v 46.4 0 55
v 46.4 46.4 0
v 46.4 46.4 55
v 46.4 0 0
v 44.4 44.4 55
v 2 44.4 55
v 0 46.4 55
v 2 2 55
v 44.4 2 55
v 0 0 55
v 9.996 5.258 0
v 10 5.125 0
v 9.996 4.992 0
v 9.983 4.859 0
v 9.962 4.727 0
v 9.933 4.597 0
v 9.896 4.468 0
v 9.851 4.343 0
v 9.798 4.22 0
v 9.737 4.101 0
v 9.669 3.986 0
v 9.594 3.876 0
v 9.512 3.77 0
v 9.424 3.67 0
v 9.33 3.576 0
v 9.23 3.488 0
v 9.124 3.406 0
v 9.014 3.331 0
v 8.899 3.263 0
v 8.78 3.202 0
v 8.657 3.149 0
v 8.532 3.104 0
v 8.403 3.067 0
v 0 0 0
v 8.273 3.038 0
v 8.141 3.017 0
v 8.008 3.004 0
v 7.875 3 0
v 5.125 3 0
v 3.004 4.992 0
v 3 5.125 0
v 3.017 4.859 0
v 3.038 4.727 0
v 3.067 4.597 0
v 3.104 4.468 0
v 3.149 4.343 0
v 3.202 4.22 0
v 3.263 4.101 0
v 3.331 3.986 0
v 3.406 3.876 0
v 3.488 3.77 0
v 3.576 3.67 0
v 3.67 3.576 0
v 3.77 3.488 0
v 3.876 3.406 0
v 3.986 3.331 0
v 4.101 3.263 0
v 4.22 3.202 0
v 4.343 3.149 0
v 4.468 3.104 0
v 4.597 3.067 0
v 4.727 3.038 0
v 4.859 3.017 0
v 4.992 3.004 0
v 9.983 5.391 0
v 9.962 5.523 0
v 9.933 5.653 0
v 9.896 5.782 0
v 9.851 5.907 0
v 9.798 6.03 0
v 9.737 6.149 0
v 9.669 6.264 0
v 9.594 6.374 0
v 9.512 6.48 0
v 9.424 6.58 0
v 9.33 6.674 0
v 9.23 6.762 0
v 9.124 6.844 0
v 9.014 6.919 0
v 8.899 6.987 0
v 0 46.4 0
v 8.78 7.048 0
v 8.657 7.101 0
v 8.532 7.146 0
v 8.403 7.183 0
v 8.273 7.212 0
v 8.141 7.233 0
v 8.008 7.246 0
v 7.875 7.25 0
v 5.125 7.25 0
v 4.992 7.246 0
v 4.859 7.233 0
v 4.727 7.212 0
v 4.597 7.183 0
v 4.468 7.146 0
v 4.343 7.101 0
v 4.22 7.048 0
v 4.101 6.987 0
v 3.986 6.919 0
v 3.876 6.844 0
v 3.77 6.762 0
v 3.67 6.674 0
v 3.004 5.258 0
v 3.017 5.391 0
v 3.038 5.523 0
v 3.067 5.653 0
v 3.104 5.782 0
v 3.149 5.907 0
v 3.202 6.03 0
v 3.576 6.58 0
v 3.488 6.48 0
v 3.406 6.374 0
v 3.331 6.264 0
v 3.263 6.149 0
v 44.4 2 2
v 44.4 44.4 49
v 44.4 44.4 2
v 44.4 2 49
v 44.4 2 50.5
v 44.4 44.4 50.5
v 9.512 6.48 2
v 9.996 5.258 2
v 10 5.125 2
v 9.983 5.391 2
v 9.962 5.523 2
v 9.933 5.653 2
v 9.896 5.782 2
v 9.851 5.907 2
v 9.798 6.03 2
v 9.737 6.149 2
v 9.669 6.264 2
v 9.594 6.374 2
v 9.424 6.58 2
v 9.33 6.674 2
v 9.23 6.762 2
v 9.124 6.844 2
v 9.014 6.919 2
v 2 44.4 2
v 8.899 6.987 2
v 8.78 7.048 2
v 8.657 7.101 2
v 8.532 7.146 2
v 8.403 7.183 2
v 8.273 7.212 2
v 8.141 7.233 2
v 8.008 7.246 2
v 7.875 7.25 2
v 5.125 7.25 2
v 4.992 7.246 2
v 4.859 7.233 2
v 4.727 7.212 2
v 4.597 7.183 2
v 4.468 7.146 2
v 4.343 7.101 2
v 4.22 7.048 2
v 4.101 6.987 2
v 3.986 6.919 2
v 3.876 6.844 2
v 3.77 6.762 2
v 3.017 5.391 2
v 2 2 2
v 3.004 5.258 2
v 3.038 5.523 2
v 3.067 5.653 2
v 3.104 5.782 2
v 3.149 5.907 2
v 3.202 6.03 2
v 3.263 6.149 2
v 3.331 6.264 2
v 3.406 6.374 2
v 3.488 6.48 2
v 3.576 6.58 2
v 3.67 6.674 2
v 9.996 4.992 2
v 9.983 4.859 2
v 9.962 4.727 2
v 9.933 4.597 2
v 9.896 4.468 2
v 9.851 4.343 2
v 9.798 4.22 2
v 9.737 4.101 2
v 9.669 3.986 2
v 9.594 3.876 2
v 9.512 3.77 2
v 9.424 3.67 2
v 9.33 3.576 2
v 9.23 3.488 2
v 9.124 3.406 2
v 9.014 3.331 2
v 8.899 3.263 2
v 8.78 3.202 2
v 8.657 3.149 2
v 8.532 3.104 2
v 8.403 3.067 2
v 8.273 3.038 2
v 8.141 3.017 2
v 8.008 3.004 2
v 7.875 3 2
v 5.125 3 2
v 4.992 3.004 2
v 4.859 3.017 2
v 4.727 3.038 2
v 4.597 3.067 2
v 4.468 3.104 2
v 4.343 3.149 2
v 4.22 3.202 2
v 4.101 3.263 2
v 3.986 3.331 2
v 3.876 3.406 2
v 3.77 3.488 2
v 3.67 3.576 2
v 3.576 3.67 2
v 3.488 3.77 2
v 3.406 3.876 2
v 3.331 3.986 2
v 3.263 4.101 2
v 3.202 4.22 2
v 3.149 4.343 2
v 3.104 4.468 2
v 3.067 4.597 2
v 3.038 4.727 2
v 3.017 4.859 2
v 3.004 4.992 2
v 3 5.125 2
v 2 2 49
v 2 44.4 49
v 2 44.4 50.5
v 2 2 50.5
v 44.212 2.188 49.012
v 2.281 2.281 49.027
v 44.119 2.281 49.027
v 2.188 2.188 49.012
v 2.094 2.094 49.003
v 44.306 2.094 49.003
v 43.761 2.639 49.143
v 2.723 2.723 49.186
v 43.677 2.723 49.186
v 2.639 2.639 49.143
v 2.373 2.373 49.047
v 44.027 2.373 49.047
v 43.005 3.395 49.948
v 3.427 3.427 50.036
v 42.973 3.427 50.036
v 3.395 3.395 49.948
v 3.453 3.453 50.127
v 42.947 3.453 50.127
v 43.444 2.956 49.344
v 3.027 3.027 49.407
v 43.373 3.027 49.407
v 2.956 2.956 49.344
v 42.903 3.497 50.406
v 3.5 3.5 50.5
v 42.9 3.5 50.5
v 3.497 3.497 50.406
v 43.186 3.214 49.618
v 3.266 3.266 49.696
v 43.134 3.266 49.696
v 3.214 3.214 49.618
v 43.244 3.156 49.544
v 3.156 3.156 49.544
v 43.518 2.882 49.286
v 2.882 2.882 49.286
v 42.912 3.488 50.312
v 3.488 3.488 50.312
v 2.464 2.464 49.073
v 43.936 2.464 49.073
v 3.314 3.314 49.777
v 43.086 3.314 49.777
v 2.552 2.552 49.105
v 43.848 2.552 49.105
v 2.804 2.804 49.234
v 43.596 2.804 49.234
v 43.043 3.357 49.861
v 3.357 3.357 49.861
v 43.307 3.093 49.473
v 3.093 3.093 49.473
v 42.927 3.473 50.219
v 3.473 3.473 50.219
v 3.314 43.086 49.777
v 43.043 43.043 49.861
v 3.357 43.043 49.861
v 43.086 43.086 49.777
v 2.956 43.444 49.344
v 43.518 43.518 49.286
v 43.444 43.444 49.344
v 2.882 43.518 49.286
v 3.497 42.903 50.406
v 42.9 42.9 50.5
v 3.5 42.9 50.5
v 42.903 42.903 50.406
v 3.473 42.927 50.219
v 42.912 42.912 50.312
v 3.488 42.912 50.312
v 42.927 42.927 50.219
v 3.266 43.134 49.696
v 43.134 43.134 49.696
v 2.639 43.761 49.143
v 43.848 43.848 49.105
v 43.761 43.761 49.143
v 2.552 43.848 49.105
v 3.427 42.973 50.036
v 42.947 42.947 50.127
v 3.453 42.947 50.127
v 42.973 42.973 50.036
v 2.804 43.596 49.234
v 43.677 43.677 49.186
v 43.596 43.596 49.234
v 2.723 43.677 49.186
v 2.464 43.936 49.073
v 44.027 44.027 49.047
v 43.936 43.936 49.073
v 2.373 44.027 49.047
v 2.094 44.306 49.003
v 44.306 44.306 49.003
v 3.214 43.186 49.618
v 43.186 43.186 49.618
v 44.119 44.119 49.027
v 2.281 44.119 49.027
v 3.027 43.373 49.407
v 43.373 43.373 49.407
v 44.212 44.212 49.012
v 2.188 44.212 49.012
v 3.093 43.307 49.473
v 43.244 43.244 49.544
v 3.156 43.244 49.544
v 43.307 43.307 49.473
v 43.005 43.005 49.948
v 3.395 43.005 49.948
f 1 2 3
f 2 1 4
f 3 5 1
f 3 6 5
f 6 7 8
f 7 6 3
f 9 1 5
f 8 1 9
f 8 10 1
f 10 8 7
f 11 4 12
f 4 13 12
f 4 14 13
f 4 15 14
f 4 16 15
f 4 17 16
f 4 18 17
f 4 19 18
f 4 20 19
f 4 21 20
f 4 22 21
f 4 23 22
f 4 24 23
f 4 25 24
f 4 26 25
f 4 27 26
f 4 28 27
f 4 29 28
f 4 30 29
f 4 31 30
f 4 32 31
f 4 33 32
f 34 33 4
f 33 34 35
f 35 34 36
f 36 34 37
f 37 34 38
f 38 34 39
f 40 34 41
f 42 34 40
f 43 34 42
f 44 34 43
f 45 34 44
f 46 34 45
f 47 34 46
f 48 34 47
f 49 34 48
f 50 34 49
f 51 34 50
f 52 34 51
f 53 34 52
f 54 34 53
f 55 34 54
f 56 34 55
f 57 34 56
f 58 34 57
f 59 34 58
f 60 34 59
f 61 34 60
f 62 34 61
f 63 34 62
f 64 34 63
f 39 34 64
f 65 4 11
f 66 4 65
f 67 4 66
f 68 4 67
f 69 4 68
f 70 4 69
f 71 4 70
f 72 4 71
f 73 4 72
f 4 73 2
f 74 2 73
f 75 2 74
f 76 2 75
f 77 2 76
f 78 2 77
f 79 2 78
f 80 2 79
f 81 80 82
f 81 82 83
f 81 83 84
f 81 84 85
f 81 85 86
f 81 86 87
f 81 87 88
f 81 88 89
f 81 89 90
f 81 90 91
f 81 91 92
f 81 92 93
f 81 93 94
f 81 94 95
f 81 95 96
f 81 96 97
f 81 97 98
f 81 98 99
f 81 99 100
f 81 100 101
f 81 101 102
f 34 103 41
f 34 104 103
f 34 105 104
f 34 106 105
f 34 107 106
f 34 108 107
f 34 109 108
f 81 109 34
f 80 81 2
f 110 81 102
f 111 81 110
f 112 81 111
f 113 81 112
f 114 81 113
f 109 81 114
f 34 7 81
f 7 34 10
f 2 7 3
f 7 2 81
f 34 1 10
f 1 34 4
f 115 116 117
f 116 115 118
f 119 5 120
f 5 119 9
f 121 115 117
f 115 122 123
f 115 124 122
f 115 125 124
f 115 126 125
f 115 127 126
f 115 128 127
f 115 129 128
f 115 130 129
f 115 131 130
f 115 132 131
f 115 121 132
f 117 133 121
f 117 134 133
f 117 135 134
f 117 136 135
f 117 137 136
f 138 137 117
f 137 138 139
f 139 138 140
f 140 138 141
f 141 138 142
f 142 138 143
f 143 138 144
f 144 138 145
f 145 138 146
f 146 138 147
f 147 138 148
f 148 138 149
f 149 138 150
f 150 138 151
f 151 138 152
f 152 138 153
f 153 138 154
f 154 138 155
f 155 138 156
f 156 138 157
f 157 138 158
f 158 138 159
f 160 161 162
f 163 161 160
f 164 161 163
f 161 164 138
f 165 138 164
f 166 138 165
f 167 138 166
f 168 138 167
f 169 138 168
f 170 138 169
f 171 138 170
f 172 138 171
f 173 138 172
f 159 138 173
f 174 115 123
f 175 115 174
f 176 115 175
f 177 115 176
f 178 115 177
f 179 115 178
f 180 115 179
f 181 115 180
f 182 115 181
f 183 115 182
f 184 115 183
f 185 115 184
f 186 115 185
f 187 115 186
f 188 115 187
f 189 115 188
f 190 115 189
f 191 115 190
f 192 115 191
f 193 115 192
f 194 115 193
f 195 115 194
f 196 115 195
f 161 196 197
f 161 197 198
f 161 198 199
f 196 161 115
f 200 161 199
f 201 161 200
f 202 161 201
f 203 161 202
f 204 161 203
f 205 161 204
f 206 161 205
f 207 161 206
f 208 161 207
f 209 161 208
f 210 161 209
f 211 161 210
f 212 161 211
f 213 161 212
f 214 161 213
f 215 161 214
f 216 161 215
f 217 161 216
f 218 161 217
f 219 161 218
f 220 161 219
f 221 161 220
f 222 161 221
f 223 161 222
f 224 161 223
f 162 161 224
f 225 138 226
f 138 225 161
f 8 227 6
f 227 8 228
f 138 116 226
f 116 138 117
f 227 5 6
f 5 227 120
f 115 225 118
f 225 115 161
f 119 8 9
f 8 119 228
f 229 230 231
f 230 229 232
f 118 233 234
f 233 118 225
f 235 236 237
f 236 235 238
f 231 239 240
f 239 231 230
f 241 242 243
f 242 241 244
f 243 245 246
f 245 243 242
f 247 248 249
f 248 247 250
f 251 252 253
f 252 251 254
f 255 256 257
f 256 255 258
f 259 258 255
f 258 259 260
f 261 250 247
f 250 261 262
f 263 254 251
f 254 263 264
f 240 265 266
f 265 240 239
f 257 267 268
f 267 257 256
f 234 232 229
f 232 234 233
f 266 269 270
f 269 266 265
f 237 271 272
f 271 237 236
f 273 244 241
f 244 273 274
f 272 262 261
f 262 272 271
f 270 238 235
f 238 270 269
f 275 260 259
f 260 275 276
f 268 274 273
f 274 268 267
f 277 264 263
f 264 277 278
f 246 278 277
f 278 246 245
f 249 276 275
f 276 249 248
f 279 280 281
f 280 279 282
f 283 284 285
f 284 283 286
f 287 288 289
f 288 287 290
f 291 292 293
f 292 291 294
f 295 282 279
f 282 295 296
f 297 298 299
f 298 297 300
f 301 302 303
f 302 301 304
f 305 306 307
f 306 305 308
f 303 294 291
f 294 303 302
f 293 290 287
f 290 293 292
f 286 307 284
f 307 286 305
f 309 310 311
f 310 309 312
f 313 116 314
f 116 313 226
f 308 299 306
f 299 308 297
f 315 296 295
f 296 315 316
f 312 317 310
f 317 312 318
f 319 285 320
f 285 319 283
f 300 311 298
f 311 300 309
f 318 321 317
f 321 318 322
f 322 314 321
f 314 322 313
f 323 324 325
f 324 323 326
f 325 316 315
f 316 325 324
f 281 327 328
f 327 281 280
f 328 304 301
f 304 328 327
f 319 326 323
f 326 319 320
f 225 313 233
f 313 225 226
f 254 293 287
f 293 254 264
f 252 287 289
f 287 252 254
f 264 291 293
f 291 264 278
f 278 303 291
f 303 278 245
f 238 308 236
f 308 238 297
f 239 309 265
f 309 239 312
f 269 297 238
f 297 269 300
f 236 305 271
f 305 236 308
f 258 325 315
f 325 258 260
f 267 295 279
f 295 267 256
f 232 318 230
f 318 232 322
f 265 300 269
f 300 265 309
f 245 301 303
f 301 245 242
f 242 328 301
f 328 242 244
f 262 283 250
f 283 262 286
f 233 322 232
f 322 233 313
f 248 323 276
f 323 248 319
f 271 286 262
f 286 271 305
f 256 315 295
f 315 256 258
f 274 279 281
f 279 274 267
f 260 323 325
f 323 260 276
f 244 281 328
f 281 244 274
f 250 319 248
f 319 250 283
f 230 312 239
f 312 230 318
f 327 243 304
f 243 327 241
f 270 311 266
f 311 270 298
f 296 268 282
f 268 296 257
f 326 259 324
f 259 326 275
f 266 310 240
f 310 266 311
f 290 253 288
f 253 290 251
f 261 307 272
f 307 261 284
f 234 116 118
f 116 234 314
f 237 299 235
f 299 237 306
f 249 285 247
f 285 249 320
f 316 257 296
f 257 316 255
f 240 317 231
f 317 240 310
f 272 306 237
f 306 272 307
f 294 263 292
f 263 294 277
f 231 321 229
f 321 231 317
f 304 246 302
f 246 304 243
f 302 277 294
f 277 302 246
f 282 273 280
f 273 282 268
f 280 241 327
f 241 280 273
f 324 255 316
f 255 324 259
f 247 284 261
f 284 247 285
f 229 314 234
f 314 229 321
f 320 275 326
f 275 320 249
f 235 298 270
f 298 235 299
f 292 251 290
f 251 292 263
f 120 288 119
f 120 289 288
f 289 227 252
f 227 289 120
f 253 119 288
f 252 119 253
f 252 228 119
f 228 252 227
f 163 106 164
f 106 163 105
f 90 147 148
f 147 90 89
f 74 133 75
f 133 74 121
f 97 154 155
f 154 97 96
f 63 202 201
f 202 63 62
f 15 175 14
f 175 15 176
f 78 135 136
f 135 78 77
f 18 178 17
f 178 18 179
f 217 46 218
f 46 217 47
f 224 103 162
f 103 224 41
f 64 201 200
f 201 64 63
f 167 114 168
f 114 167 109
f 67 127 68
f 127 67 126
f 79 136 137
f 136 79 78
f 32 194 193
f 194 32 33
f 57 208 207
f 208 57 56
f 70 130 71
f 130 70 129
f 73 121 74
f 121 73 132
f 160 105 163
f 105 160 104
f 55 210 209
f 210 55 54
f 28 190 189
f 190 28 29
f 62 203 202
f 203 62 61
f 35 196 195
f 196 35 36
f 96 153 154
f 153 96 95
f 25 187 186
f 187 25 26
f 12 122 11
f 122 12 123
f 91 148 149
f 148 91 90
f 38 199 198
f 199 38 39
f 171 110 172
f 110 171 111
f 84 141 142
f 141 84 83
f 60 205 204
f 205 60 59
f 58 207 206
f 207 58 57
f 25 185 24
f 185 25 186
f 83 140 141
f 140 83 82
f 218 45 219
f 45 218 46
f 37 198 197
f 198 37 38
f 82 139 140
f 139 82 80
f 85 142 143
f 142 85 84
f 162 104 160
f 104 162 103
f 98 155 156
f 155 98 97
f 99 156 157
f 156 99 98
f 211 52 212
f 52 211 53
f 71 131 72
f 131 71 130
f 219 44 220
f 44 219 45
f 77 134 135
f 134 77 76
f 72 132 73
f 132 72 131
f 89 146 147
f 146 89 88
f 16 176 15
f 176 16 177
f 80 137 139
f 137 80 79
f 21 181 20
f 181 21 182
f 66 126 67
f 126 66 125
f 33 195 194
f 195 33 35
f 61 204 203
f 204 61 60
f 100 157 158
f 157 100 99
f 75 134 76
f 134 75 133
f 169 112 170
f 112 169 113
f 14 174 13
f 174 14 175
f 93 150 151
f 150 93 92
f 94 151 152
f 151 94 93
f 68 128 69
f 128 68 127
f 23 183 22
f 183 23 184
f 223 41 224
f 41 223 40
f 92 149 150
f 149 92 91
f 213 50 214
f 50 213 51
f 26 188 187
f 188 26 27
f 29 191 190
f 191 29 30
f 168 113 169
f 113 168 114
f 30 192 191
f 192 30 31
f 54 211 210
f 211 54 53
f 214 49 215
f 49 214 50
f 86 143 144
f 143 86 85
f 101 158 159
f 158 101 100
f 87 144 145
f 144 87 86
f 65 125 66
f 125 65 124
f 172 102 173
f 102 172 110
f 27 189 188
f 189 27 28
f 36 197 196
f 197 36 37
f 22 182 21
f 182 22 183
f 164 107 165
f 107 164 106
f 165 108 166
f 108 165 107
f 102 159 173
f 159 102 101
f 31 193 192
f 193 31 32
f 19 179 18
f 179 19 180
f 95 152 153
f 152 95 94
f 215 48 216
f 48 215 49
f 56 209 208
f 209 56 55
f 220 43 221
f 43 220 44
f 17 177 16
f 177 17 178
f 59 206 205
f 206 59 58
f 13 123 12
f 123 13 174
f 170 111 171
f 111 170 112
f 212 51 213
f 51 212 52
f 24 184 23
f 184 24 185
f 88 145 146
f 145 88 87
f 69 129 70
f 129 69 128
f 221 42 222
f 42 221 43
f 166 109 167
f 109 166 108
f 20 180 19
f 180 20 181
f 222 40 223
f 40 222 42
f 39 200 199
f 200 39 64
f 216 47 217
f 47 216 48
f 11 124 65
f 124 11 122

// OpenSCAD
$fn = 100;

// 42.1 < x < 42.5
inside_size = 42.4;
inside_border = 1.5;
border_height = 4.5;
inside_height = 53;
wall = 2;
// 4 << 
wire_diameter = 4.25;
wire_extra_space = 2.75;

//if (false)
difference() {
union() {
  difference() {
    cube([inside_size + 2 * wall, inside_size + 2 * wall, inside_height + wall]);
    translate([wall, wall, wall]) cube([inside_size, inside_size, inside_height + wall]);
  }

  translate([0, 0, -border_height]) difference() {
    translate([0, 0, inside_height + wall]) union() {
      translate([wall, wall, 0]) rotate([0, 90, 0]) cylinder(r = inside_border, h = inside_size);
      translate([wall, wall + inside_size, 0]) rotate([0, 90, 0]) cylinder(r = inside_border, h = inside_size);
      translate([wall, wall, 0]) rotate([-90, 0, 0]) cylinder(r = inside_border, h = inside_size);
      translate([wall + inside_size, wall, 0]) rotate([-90, 0, 0]) cylinder(r = inside_border, h = inside_size);
    }
    translate([-100, -20, 0]) cube([100, 100, 100]);
    translate([inside_size + 2 * wall, -20, 0]) cube([100, 100, 100]);
    translate([-20, -100, 0]) cube([100, 100, 100]);
    translate([-20, inside_size + 2 * wall, 0]) cube([100, 100, 100]);
    translate([-2, -2, inside_height + wall]) cube([100, 100, 100]);
  }
}
  translate([wall + wire_diameter / 2 + 1, wall + wire_diameter / 2 + 1, -1]) hull() {
    cylinder(d = wire_diameter, h = 4);
    translate([wire_extra_space, 0, 0]) cylinder(d = wire_diameter, h = 4);
  }
//  translate([-20, -20, 0]) cube([100, 100, 100 + wall + inside_height - (border_height + 1)]);
}
